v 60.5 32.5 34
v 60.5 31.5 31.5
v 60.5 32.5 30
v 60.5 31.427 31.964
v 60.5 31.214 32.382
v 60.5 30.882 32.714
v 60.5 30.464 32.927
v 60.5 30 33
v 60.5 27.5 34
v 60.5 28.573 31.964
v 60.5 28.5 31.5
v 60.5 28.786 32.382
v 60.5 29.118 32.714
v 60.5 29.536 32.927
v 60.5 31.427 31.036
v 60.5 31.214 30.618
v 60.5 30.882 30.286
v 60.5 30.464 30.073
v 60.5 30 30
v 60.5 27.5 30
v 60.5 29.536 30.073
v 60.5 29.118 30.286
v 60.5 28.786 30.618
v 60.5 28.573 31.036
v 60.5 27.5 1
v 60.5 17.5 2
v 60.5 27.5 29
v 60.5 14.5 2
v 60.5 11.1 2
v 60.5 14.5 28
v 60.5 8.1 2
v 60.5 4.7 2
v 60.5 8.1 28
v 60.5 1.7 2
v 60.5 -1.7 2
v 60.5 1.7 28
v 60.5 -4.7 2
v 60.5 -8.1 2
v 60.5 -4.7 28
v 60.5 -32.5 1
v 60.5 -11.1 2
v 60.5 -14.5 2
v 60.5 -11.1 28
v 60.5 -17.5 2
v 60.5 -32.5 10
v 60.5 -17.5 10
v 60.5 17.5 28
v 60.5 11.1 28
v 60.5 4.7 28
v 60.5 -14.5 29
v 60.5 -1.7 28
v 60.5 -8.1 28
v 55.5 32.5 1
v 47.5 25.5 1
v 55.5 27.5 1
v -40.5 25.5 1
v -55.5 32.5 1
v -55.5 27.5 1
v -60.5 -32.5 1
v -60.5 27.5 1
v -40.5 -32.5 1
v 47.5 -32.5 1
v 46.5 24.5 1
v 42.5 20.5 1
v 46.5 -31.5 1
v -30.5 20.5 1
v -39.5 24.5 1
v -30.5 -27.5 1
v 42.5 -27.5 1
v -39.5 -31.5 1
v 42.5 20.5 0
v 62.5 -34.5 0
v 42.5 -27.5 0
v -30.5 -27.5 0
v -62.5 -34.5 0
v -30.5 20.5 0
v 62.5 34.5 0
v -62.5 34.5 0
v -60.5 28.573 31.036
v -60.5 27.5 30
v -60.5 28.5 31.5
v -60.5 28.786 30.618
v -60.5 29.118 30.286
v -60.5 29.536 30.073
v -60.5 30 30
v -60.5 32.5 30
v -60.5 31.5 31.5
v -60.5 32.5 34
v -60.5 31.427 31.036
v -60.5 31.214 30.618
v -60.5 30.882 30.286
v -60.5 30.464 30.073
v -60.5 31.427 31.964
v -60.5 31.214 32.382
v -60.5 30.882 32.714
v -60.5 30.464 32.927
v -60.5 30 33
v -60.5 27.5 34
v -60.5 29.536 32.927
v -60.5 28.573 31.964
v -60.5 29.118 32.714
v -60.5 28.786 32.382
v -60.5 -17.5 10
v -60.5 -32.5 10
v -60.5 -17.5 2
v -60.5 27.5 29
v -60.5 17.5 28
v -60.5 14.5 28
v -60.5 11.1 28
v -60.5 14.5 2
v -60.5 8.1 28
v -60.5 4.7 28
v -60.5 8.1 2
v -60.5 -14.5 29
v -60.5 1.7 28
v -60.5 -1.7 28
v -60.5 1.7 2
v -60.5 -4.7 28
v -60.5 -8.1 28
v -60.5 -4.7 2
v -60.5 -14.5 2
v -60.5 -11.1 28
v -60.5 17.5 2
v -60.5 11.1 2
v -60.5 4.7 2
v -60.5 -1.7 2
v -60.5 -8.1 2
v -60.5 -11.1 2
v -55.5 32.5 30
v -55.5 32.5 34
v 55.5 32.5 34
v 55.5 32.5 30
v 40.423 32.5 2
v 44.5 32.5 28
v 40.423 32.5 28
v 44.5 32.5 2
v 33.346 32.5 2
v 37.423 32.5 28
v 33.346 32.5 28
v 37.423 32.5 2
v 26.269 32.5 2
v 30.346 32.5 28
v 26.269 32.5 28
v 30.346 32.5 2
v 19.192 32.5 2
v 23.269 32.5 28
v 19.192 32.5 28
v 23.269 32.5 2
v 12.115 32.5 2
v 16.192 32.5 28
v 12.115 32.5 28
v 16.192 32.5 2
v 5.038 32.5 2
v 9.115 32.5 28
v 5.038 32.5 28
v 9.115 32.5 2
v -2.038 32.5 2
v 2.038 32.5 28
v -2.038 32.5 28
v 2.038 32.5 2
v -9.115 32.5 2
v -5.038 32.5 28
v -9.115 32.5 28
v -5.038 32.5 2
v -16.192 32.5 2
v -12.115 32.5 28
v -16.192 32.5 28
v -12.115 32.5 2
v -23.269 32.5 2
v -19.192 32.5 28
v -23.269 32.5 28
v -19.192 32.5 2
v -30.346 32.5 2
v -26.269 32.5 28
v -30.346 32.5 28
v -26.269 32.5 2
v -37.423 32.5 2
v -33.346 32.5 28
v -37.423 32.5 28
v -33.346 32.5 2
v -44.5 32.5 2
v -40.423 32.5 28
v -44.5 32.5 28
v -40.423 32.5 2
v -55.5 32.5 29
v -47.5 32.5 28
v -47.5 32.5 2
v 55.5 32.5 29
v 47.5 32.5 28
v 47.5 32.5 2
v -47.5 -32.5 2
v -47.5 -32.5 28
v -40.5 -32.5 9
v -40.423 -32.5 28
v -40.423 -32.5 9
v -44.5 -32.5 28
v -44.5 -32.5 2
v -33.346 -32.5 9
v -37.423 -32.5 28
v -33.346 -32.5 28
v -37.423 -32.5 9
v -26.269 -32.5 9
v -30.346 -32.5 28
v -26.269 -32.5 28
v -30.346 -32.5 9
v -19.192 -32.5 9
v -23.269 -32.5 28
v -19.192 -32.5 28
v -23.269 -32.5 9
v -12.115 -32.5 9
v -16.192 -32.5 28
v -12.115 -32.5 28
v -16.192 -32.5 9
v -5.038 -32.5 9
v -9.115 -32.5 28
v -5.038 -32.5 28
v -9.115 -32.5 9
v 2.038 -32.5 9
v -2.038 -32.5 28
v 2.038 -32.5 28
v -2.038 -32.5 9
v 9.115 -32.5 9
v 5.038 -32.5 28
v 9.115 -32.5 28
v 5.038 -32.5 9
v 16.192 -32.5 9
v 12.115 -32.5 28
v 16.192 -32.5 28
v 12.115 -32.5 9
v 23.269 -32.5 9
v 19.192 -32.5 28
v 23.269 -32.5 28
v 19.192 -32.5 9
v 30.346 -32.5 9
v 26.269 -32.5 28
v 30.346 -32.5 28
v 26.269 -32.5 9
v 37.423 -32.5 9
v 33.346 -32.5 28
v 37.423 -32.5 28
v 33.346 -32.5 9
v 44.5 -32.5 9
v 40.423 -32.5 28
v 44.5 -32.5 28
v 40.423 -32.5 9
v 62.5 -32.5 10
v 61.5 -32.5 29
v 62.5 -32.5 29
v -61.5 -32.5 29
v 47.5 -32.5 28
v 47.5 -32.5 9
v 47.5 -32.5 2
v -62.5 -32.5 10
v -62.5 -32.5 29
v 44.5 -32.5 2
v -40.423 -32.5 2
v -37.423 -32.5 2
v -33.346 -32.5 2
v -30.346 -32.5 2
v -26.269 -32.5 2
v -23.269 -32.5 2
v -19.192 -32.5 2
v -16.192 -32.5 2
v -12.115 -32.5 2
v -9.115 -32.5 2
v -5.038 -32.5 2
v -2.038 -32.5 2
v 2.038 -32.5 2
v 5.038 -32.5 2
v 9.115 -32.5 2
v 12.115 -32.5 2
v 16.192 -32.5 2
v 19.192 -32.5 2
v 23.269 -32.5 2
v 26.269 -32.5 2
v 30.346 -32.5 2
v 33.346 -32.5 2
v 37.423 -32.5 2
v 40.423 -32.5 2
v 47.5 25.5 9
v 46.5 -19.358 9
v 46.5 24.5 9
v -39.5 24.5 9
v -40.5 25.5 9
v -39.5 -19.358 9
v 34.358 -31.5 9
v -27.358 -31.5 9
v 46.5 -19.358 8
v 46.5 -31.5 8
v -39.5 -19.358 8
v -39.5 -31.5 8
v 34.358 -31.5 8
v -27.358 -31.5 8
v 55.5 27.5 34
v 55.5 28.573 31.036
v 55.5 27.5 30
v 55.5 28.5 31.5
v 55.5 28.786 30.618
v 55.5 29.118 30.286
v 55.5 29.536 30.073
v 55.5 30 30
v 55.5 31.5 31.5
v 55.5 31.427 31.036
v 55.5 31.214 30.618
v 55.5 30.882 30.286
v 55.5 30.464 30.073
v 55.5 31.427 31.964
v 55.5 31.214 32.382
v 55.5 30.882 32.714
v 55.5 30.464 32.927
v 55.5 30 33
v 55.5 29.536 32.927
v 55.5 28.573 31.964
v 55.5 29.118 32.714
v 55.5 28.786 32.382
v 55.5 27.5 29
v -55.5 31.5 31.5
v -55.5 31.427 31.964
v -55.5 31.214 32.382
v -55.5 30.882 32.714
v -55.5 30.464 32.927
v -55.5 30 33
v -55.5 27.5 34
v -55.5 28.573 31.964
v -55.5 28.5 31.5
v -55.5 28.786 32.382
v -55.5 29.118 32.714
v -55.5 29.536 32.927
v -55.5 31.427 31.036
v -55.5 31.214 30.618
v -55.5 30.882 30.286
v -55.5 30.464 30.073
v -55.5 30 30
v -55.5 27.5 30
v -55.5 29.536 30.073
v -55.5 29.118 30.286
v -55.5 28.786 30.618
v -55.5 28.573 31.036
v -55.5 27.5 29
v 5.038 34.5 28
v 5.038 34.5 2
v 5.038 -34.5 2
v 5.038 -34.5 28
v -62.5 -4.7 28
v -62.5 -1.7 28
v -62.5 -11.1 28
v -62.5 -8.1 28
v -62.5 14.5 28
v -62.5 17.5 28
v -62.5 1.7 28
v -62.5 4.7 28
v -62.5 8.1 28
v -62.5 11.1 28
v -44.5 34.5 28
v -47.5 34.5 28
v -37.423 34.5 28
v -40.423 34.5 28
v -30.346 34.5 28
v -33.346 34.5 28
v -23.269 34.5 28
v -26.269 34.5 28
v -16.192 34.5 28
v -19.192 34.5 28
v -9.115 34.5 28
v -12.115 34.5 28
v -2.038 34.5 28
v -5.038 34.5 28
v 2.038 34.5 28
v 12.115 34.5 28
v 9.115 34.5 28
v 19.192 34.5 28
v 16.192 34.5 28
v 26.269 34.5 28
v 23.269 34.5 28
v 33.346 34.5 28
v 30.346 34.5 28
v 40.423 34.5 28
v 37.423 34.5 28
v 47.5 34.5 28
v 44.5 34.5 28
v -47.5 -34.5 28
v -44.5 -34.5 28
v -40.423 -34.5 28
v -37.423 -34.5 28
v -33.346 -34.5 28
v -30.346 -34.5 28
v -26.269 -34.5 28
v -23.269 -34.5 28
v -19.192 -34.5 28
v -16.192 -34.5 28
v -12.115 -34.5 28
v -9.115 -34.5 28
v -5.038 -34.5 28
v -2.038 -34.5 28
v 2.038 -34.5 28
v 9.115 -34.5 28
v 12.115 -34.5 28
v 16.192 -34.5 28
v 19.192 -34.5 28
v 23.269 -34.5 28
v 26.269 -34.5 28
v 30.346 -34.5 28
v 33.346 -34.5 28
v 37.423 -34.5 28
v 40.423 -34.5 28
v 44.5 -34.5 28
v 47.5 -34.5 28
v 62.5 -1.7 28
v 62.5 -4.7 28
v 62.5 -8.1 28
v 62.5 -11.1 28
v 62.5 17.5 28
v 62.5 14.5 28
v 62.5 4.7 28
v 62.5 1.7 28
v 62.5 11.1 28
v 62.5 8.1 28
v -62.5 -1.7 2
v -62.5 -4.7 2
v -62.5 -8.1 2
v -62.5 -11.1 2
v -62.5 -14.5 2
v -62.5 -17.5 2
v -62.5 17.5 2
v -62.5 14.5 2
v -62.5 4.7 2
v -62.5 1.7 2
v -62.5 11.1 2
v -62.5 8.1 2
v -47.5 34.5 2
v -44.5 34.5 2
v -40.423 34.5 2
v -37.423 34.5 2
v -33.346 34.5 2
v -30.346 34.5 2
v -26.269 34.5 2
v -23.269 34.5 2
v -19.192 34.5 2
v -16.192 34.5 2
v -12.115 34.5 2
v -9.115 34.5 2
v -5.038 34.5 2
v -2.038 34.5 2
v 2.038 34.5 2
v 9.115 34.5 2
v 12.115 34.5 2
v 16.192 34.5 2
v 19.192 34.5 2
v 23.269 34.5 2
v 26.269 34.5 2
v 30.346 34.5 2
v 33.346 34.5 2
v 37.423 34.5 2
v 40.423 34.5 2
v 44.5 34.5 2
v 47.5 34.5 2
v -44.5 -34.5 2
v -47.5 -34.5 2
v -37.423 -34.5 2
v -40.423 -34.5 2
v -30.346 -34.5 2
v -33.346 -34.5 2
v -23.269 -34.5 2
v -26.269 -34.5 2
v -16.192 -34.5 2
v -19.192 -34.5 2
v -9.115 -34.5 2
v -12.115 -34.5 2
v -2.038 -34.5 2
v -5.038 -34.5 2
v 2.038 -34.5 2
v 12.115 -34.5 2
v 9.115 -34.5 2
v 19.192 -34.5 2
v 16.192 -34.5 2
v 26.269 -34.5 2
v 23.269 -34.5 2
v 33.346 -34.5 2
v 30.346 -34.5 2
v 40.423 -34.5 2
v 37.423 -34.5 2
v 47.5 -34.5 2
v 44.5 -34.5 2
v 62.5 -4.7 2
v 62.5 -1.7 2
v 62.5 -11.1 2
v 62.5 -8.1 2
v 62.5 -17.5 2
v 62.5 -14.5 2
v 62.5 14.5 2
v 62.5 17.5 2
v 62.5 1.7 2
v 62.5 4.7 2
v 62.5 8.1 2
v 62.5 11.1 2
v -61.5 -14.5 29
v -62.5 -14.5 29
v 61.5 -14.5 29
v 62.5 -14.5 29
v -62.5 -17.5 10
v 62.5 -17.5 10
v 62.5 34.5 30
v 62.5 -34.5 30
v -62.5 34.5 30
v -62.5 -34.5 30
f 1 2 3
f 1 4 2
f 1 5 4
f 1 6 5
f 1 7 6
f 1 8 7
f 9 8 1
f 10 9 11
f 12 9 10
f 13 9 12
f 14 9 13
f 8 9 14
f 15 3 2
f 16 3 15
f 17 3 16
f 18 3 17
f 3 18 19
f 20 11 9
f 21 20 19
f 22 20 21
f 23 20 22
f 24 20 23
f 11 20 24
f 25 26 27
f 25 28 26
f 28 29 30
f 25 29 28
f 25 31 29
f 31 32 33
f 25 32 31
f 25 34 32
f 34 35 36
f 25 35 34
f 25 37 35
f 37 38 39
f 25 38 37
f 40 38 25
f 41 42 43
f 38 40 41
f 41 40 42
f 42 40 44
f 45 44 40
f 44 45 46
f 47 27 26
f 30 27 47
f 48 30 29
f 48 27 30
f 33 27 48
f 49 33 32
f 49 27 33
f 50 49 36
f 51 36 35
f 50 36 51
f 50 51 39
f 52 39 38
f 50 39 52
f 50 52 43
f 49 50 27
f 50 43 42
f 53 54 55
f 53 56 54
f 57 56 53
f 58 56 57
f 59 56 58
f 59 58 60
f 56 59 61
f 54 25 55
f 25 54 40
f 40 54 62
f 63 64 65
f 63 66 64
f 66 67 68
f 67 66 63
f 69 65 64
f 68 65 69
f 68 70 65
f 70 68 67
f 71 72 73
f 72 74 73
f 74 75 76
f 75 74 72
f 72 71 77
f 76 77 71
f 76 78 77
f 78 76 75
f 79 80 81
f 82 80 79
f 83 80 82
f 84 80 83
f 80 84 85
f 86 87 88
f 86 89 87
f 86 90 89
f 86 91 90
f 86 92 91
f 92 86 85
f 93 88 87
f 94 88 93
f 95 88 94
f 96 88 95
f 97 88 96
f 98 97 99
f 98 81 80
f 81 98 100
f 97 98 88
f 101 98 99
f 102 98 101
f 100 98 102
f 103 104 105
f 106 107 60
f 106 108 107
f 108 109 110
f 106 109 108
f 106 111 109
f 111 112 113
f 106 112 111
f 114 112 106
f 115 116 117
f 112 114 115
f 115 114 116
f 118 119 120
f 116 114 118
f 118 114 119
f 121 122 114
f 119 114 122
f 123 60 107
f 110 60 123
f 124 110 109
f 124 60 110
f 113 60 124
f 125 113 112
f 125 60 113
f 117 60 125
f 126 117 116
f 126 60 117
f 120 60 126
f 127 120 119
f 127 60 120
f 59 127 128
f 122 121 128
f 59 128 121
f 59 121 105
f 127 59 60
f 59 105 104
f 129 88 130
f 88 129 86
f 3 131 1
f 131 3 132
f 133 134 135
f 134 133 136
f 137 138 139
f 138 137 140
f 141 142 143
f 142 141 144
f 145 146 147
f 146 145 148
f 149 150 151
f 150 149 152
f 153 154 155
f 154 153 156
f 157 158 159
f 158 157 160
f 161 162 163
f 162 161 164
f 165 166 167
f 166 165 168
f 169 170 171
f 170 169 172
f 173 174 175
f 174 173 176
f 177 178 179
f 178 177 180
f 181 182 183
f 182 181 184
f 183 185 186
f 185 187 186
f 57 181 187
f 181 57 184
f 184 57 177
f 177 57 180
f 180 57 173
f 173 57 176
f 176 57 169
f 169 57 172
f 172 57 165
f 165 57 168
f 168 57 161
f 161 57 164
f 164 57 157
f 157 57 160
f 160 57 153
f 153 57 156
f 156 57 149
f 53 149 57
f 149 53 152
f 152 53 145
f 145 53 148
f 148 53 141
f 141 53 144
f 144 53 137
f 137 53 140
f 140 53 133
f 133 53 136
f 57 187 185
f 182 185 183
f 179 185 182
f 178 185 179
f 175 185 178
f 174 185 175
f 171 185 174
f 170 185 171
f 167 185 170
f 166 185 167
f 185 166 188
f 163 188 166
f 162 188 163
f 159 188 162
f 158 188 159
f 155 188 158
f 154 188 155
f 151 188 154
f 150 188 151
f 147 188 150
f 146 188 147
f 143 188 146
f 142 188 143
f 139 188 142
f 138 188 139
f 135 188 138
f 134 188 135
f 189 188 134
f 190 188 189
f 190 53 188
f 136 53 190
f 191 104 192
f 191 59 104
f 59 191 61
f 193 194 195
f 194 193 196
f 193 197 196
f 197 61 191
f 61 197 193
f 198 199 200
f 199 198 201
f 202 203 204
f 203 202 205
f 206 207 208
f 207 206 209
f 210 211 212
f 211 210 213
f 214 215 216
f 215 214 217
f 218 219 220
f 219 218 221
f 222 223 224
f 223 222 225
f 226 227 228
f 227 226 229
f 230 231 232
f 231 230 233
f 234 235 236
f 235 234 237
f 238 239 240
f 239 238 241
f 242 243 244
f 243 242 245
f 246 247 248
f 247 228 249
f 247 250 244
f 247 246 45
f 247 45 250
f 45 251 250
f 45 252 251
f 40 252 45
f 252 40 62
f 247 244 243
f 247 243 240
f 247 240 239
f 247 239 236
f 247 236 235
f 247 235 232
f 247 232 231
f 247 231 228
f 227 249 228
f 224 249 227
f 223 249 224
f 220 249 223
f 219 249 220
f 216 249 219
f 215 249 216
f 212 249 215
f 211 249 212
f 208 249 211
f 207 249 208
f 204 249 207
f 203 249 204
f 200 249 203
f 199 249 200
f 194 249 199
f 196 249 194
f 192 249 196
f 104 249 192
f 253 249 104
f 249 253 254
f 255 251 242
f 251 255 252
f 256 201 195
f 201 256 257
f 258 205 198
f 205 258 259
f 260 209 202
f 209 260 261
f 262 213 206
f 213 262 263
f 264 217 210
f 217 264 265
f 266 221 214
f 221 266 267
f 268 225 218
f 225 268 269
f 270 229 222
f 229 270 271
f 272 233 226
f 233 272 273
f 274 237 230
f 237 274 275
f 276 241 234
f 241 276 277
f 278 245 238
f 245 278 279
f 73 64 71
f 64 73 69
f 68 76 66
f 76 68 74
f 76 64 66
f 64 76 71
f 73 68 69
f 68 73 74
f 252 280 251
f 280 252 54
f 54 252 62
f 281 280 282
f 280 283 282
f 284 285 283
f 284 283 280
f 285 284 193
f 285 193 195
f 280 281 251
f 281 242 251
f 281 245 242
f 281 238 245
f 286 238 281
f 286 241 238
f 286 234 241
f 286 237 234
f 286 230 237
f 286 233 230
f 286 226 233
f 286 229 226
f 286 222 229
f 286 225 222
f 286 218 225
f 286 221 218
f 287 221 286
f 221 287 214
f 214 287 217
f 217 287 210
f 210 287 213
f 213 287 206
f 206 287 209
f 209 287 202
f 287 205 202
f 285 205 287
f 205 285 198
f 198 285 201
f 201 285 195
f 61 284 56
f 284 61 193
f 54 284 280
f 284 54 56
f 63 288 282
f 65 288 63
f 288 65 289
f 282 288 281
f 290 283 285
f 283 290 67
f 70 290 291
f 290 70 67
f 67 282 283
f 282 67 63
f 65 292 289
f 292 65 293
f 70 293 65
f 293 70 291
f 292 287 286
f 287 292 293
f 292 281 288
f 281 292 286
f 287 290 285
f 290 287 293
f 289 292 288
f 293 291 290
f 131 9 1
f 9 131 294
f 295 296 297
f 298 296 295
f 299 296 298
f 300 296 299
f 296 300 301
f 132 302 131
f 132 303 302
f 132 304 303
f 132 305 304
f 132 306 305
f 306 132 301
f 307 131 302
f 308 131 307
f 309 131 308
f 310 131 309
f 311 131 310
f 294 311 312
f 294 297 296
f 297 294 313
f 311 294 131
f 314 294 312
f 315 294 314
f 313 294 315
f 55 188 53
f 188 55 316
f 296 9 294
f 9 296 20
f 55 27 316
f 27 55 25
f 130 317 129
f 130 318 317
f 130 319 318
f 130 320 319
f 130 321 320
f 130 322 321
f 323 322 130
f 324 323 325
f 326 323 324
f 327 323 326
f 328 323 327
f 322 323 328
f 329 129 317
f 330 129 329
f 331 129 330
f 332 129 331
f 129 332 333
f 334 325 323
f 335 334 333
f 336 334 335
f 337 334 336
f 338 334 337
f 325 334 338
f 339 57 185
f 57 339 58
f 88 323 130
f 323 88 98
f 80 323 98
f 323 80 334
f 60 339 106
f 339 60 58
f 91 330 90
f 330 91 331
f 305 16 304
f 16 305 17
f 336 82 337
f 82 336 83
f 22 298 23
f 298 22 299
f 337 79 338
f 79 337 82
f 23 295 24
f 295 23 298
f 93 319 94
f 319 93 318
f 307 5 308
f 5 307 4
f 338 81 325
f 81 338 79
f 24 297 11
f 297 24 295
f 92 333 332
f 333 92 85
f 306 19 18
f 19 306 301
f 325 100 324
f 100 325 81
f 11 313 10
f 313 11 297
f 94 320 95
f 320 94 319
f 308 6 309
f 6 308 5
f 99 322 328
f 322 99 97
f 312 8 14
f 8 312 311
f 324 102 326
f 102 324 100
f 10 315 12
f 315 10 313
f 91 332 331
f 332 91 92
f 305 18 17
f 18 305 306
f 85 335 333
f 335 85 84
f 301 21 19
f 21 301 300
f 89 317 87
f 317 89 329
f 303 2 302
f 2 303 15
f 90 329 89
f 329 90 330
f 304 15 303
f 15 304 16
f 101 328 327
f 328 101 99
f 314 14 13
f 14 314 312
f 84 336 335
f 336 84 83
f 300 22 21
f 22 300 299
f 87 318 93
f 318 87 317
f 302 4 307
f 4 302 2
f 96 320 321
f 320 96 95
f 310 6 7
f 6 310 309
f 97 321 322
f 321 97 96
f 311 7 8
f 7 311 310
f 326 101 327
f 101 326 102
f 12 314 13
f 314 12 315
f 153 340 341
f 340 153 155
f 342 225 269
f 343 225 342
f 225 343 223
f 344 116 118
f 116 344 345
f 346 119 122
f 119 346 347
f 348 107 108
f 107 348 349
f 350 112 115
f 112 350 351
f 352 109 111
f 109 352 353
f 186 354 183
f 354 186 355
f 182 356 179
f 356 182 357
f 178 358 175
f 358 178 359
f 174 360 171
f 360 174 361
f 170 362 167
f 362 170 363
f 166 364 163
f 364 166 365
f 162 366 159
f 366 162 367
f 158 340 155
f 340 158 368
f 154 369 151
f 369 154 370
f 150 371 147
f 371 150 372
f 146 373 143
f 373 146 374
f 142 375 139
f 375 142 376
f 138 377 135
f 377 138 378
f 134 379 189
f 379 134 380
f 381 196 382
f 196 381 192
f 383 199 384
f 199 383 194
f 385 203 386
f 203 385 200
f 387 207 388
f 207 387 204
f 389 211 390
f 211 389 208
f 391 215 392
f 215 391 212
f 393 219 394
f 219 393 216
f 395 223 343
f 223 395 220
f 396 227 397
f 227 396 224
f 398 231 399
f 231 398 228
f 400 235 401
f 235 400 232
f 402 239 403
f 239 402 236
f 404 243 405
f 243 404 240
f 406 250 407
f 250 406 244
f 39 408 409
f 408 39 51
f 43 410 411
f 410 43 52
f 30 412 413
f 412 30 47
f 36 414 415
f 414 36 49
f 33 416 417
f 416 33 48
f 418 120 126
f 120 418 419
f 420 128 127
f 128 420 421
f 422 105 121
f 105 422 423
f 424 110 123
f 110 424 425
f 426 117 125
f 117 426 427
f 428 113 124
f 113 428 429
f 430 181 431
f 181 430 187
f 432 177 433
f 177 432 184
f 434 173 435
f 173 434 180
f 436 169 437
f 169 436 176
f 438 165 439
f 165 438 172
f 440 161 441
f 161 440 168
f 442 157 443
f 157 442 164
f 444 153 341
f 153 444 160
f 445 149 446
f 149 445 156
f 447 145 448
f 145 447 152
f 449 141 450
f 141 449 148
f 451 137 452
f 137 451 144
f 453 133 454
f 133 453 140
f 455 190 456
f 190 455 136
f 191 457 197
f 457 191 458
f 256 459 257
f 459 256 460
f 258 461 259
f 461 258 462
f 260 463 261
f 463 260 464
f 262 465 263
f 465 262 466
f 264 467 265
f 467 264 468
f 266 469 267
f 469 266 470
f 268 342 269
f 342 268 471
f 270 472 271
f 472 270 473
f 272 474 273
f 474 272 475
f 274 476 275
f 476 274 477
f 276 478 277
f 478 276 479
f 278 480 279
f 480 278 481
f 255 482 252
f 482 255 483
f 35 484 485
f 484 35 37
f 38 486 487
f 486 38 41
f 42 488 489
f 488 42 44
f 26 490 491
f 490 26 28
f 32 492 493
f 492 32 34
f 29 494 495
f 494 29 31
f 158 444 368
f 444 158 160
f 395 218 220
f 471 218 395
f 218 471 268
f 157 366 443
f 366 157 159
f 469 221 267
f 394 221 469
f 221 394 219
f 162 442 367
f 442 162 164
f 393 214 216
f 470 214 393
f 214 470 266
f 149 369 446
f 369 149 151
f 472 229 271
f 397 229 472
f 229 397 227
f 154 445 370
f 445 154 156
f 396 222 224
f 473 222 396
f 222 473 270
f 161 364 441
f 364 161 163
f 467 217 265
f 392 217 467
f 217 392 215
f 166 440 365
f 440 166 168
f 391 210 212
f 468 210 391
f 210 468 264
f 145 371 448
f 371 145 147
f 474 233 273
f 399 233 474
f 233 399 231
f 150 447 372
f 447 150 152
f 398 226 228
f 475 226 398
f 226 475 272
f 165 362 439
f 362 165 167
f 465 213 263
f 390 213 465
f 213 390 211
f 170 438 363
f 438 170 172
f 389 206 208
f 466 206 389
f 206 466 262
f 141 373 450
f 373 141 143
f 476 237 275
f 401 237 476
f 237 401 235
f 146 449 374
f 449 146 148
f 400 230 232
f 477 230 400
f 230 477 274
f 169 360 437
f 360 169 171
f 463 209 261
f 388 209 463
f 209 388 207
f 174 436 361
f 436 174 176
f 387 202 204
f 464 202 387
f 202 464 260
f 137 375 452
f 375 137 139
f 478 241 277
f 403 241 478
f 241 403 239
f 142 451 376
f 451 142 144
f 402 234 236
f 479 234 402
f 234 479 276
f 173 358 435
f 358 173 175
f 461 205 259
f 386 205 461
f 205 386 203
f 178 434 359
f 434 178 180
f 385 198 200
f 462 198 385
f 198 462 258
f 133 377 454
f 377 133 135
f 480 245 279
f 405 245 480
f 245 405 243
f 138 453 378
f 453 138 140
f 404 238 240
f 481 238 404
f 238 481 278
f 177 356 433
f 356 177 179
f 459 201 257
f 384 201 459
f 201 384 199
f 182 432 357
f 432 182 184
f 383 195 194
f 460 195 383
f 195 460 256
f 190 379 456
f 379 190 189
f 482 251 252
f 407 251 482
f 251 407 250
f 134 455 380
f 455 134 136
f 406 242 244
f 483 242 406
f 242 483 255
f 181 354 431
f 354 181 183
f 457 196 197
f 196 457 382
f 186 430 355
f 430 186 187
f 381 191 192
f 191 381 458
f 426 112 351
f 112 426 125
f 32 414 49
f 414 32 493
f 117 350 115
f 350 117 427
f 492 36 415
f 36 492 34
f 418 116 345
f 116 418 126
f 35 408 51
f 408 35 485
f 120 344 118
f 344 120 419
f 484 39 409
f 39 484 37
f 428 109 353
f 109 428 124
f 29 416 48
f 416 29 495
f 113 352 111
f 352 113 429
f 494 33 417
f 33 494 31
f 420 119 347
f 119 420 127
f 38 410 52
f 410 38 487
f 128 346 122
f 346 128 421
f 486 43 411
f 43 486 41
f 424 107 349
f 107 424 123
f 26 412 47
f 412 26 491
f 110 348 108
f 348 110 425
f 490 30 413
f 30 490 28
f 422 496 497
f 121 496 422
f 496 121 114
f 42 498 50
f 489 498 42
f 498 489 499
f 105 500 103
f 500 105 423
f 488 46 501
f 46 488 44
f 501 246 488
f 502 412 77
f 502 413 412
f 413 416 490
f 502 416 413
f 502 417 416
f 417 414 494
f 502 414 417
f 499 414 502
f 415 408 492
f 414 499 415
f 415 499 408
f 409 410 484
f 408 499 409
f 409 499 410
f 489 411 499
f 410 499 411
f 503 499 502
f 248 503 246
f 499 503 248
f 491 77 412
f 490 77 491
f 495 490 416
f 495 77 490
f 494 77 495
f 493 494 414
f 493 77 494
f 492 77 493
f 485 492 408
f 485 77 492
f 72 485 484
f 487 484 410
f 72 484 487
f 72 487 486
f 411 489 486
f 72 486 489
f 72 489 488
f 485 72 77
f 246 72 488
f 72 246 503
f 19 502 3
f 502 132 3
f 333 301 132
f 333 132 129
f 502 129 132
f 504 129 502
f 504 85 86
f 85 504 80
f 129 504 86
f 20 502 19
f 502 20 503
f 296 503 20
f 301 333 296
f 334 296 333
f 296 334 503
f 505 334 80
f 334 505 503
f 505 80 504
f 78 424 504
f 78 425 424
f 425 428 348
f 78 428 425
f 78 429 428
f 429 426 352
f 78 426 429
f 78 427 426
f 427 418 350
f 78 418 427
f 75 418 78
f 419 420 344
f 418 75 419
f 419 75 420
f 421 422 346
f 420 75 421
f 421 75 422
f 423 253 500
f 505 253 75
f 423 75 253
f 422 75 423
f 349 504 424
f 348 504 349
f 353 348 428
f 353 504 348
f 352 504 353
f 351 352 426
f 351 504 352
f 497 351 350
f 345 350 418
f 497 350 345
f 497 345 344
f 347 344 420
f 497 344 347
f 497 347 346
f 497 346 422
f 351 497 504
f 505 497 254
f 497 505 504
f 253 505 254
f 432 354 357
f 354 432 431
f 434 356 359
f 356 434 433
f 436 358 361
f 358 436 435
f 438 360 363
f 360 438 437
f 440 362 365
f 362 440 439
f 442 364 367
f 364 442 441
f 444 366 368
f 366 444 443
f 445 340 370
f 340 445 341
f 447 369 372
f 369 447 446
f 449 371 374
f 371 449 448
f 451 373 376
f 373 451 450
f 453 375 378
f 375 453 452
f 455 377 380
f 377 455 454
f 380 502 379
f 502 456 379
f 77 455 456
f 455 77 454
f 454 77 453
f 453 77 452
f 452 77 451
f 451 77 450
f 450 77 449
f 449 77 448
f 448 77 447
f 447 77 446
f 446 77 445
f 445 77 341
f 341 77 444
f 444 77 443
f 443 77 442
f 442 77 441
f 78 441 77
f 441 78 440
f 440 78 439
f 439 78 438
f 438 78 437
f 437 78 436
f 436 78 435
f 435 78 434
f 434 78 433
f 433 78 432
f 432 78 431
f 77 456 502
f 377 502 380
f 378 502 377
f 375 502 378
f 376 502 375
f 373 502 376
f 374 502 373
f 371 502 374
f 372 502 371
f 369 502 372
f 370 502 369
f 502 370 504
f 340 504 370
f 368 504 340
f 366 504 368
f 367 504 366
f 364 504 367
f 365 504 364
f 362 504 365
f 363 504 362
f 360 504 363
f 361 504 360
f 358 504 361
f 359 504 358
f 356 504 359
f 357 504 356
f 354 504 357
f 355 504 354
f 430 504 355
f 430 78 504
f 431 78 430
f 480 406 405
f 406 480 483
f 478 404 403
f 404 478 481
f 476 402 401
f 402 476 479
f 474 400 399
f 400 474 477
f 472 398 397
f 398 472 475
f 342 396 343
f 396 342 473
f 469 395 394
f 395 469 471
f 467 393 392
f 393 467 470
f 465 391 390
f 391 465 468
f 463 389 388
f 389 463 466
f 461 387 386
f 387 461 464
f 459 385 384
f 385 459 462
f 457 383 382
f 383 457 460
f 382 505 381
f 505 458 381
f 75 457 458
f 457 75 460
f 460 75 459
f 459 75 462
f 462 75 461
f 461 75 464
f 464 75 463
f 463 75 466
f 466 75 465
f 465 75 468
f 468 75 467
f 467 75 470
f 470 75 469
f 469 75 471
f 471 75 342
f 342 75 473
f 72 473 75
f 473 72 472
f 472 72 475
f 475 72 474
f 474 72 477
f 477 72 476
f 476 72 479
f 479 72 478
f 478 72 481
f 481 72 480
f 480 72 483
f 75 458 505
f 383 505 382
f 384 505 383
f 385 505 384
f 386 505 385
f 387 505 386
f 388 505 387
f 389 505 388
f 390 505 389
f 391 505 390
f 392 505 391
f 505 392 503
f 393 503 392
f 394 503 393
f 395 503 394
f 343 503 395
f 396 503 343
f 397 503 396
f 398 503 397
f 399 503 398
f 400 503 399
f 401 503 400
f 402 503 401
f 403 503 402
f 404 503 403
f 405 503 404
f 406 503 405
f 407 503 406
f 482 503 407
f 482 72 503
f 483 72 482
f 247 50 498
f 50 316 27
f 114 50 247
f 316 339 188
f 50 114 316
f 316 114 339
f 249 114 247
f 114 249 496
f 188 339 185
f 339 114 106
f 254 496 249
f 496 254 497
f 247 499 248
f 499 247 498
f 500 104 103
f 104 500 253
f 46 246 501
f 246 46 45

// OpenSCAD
wall_thickness = 1;
wlls = 2 * wall_thickness;

total_width = 121;

pi_width = 85.5; // Only lasts 19 mm down the side, 0 up
pi_height = 65;

screen_width = 73; //75, margin a bit
screen_height = 48; //50, margin a bit
// THESE ARE FROM BOUNDARIES
// Screen 3 mm from bottom, + 1 mm margin = 4 mm
// Screen 10 mm from top + 1 mm = 11
// 4 + 48 + 11 = 63, again missing a few we'll say
// 5 from bottom, 12 from top
// Screen 16 mm from left + 1mm margin = 17 mm
// BUT 28 mm from right + 1 mm margin = 29 mm
// Total = 17 + 73 + 29 = 119 .. missing a few mm add one to each side
// 18 from left, 30 from right :)


//THESE ARE FROM DISPLAY
//3 from top + 1 = 4
//3 from bottom + 1 = 4
//3 from left + 1 = 4
//9 from right + 1 = 9

display_width = 86;
display_height = 56;
display_thickness = 7; 

// 12 top, 5 bot, 18 left 30 right
screen_top_offset = 12;
screen_left_offset = 18;
display_y_off = (pi_height - screen_height)/2 - screen_top_offset;
display_x_off = (total_width - screen_width)/2 - screen_left_offset;
screen_x_off = -2.5;

total_depth = 28; // no margin here
display_depth = 7; // ish ofc

barrier_depth = 2;

cutout_height = 18;
cutout_width = 18;


//Faceplate
module faceplate(thck) {
  translate([0, 0, thck/2])
  difference() {
    cube([total_width, pi_height, thck], center=true);
    translate([display_x_off, display_y_off, 0])
      cube([screen_width, screen_height, thck + 0.2], center=true);
  }
}

module display_surround(thck) {
  translate([display_x_off + screen_x_off, display_y_off, thck/2]) // Needs another offset
  difference() {
    cube([display_width + wlls, display_height + wlls, thck],
      center=true);
    cube([display_width, display_height, thck+0.2], center=true);
  }
}

module corners(width, height, thickness, overlap, nesw=[1,1,1,1]) {
  translate([display_x_off + screen_x_off, display_y_off, thickness/2])
  intersection() {
    cube([width, height, thickness], center=true);
    union() {
      if (nesw[0] == 1)
        translate([width/2, height/2, 0])
          rotate([0,0,45])
            cube(2*overlap, center = true);
      if (nesw[1] == 1)
        translate([width/2, -height/2, 0])
          rotate([0,0,45])
            cube(2*overlap, center = true);
      if (nesw[2] == 1)
        translate([-width/2, -height/2, 0])
          rotate([0,0,45])
            cube(2*overlap, center = true);
      if (nesw[3] == 1)
        translate([-width/2, height/2, 0])
          rotate([0,0,45])
            cube(2*overlap, center = true);
    }
  }
}

post_width = 5;
module posts(height) {
  radius = 1.5;
  cendheight = height + 2*radius + 1;

  slot_width = 3;
  slot_height = 1.5;
  sendheight = height + 1;
  difference() {
    union() {
      //Top
      translate([total_width/2-post_width/2, pi_height/2-post_width/2, cendheight/2])
        cube([post_width, post_width, cendheight], center=true);
      translate([-total_width/2+post_width/2, pi_height/2-post_width/2, cendheight/2])
        cube([post_width, post_width, cendheight], center=true);

      //Bottom
      //translate([total_width/2-post_width/2, -pi_height/2+post_width/2, sendheight/2])
      //  cube([post_width, post_width, sendheight], center=true);
      //translate([-total_width/2+post_width/2, -pi_height/2+post_width/2, sendheight/2])
      //  cube([post_width, post_width, sendheight], center=true);
    }
    translate([0, pi_height/2-post_width/2, height+radius])
      rotate([0, 90, 0])
        cylinder(r=radius, h=4*total_width, center=true, $fn=20);
    //translate([total_width/2-post_width/2, -pi_height/2+post_width/2, height-0.5])
    //  cube([slot_width, 2*post_width, slot_height], center=true);
    //translate([-total_width/2+post_width/2, -pi_height/2+post_width/2, height-0.5])
    //  cube([slot_width, 2*post_width, slot_height], center=true);
    // Commented out for power conn / Ethernet but maybe decent idea
  }
}

module cooling_holes(air_height) {
  air_width = 3;
  air_margin_h =15;
  air_margin_v =17;

  air_horiz = 7;
  air_vert = 3;

  // With Margin
  hd = ((total_width+2*wlls)/2-air_margin_h-air_width/2)/(air_horiz-0.5);
  // With Margin = hd
  //hd = (total_width+2*wlls+air_width)/(2*air_horiz + 1);
  for (i = [1:air_horiz]) {
    translate([(i-0.5)*hd, 0, 0])
      cube([air_width, pi_height*2, air_height], center=true);
    translate([(0.5-i)*hd, 0, 0])
      cube([air_width, pi_height*2, air_height], center=true);
  }

  // With Margin
  vd = ((pi_height+2*wlls)/2-air_margin_v-air_width/2)/(air_vert-0.5);
  // With Margin = vd
  //vd = (pi_height+2*wlls+air_width)/(2*air_vert + 1);
  for (i = [1:air_vert]) {
    translate([0, (i-0.5)*vd, 0])
      cube([total_width*2, air_width, air_height], center=true);
    translate([0, (0.5-i)*vd, 0])
      cube([total_width*2, air_width, air_height], center=true);
  }
}

module cutout(height) {
  endheight = cutout_height+wall_thickness;
  translate([0, -pi_height/2+cutout_width/2, height/2-endheight/2-wall_thickness]) //TODO X/Z
    cube([total_width*2, cutout_width, endheight], center=true);
}

module walls(height) {
  translate([0, 0, height/2])
    difference() {
      cube([total_width+2*wlls, pi_height+2*wlls, height], center=true);
      cube([total_width, pi_height, height+0.2], center=true);
      translate([0, 0, height/2])
      cube([total_width+wlls, pi_height+wlls,wlls], center=true);

      cooling_holes(height-2*wlls);
      cutout(height);
    }
}

module front_part() {
  faceplate(wall_thickness);
  translate([0, 0, wall_thickness])
    display_surround(display_depth+wall_thickness);
  translate([0, 0, wall_thickness + display_depth])
    corners(display_width+wlls, display_height+wlls, wall_thickness, 10, [0,1,1,0]);
  posts(total_depth+wlls);
  walls(total_depth+wlls);
}

module back_plate(thck) {
  difference() {
    translate([0, 0, thck/2])
      cube([total_width+wlls, pi_height+wlls, thck], center=true);
    translate([0, 0, -0.1])
      posts(thck + 0.2);
  }
}

module back_part() {
  back_plate(wall_thickness);
}

front_part();
translate([0,0,total_depth+wall_thickness])
back_part();
